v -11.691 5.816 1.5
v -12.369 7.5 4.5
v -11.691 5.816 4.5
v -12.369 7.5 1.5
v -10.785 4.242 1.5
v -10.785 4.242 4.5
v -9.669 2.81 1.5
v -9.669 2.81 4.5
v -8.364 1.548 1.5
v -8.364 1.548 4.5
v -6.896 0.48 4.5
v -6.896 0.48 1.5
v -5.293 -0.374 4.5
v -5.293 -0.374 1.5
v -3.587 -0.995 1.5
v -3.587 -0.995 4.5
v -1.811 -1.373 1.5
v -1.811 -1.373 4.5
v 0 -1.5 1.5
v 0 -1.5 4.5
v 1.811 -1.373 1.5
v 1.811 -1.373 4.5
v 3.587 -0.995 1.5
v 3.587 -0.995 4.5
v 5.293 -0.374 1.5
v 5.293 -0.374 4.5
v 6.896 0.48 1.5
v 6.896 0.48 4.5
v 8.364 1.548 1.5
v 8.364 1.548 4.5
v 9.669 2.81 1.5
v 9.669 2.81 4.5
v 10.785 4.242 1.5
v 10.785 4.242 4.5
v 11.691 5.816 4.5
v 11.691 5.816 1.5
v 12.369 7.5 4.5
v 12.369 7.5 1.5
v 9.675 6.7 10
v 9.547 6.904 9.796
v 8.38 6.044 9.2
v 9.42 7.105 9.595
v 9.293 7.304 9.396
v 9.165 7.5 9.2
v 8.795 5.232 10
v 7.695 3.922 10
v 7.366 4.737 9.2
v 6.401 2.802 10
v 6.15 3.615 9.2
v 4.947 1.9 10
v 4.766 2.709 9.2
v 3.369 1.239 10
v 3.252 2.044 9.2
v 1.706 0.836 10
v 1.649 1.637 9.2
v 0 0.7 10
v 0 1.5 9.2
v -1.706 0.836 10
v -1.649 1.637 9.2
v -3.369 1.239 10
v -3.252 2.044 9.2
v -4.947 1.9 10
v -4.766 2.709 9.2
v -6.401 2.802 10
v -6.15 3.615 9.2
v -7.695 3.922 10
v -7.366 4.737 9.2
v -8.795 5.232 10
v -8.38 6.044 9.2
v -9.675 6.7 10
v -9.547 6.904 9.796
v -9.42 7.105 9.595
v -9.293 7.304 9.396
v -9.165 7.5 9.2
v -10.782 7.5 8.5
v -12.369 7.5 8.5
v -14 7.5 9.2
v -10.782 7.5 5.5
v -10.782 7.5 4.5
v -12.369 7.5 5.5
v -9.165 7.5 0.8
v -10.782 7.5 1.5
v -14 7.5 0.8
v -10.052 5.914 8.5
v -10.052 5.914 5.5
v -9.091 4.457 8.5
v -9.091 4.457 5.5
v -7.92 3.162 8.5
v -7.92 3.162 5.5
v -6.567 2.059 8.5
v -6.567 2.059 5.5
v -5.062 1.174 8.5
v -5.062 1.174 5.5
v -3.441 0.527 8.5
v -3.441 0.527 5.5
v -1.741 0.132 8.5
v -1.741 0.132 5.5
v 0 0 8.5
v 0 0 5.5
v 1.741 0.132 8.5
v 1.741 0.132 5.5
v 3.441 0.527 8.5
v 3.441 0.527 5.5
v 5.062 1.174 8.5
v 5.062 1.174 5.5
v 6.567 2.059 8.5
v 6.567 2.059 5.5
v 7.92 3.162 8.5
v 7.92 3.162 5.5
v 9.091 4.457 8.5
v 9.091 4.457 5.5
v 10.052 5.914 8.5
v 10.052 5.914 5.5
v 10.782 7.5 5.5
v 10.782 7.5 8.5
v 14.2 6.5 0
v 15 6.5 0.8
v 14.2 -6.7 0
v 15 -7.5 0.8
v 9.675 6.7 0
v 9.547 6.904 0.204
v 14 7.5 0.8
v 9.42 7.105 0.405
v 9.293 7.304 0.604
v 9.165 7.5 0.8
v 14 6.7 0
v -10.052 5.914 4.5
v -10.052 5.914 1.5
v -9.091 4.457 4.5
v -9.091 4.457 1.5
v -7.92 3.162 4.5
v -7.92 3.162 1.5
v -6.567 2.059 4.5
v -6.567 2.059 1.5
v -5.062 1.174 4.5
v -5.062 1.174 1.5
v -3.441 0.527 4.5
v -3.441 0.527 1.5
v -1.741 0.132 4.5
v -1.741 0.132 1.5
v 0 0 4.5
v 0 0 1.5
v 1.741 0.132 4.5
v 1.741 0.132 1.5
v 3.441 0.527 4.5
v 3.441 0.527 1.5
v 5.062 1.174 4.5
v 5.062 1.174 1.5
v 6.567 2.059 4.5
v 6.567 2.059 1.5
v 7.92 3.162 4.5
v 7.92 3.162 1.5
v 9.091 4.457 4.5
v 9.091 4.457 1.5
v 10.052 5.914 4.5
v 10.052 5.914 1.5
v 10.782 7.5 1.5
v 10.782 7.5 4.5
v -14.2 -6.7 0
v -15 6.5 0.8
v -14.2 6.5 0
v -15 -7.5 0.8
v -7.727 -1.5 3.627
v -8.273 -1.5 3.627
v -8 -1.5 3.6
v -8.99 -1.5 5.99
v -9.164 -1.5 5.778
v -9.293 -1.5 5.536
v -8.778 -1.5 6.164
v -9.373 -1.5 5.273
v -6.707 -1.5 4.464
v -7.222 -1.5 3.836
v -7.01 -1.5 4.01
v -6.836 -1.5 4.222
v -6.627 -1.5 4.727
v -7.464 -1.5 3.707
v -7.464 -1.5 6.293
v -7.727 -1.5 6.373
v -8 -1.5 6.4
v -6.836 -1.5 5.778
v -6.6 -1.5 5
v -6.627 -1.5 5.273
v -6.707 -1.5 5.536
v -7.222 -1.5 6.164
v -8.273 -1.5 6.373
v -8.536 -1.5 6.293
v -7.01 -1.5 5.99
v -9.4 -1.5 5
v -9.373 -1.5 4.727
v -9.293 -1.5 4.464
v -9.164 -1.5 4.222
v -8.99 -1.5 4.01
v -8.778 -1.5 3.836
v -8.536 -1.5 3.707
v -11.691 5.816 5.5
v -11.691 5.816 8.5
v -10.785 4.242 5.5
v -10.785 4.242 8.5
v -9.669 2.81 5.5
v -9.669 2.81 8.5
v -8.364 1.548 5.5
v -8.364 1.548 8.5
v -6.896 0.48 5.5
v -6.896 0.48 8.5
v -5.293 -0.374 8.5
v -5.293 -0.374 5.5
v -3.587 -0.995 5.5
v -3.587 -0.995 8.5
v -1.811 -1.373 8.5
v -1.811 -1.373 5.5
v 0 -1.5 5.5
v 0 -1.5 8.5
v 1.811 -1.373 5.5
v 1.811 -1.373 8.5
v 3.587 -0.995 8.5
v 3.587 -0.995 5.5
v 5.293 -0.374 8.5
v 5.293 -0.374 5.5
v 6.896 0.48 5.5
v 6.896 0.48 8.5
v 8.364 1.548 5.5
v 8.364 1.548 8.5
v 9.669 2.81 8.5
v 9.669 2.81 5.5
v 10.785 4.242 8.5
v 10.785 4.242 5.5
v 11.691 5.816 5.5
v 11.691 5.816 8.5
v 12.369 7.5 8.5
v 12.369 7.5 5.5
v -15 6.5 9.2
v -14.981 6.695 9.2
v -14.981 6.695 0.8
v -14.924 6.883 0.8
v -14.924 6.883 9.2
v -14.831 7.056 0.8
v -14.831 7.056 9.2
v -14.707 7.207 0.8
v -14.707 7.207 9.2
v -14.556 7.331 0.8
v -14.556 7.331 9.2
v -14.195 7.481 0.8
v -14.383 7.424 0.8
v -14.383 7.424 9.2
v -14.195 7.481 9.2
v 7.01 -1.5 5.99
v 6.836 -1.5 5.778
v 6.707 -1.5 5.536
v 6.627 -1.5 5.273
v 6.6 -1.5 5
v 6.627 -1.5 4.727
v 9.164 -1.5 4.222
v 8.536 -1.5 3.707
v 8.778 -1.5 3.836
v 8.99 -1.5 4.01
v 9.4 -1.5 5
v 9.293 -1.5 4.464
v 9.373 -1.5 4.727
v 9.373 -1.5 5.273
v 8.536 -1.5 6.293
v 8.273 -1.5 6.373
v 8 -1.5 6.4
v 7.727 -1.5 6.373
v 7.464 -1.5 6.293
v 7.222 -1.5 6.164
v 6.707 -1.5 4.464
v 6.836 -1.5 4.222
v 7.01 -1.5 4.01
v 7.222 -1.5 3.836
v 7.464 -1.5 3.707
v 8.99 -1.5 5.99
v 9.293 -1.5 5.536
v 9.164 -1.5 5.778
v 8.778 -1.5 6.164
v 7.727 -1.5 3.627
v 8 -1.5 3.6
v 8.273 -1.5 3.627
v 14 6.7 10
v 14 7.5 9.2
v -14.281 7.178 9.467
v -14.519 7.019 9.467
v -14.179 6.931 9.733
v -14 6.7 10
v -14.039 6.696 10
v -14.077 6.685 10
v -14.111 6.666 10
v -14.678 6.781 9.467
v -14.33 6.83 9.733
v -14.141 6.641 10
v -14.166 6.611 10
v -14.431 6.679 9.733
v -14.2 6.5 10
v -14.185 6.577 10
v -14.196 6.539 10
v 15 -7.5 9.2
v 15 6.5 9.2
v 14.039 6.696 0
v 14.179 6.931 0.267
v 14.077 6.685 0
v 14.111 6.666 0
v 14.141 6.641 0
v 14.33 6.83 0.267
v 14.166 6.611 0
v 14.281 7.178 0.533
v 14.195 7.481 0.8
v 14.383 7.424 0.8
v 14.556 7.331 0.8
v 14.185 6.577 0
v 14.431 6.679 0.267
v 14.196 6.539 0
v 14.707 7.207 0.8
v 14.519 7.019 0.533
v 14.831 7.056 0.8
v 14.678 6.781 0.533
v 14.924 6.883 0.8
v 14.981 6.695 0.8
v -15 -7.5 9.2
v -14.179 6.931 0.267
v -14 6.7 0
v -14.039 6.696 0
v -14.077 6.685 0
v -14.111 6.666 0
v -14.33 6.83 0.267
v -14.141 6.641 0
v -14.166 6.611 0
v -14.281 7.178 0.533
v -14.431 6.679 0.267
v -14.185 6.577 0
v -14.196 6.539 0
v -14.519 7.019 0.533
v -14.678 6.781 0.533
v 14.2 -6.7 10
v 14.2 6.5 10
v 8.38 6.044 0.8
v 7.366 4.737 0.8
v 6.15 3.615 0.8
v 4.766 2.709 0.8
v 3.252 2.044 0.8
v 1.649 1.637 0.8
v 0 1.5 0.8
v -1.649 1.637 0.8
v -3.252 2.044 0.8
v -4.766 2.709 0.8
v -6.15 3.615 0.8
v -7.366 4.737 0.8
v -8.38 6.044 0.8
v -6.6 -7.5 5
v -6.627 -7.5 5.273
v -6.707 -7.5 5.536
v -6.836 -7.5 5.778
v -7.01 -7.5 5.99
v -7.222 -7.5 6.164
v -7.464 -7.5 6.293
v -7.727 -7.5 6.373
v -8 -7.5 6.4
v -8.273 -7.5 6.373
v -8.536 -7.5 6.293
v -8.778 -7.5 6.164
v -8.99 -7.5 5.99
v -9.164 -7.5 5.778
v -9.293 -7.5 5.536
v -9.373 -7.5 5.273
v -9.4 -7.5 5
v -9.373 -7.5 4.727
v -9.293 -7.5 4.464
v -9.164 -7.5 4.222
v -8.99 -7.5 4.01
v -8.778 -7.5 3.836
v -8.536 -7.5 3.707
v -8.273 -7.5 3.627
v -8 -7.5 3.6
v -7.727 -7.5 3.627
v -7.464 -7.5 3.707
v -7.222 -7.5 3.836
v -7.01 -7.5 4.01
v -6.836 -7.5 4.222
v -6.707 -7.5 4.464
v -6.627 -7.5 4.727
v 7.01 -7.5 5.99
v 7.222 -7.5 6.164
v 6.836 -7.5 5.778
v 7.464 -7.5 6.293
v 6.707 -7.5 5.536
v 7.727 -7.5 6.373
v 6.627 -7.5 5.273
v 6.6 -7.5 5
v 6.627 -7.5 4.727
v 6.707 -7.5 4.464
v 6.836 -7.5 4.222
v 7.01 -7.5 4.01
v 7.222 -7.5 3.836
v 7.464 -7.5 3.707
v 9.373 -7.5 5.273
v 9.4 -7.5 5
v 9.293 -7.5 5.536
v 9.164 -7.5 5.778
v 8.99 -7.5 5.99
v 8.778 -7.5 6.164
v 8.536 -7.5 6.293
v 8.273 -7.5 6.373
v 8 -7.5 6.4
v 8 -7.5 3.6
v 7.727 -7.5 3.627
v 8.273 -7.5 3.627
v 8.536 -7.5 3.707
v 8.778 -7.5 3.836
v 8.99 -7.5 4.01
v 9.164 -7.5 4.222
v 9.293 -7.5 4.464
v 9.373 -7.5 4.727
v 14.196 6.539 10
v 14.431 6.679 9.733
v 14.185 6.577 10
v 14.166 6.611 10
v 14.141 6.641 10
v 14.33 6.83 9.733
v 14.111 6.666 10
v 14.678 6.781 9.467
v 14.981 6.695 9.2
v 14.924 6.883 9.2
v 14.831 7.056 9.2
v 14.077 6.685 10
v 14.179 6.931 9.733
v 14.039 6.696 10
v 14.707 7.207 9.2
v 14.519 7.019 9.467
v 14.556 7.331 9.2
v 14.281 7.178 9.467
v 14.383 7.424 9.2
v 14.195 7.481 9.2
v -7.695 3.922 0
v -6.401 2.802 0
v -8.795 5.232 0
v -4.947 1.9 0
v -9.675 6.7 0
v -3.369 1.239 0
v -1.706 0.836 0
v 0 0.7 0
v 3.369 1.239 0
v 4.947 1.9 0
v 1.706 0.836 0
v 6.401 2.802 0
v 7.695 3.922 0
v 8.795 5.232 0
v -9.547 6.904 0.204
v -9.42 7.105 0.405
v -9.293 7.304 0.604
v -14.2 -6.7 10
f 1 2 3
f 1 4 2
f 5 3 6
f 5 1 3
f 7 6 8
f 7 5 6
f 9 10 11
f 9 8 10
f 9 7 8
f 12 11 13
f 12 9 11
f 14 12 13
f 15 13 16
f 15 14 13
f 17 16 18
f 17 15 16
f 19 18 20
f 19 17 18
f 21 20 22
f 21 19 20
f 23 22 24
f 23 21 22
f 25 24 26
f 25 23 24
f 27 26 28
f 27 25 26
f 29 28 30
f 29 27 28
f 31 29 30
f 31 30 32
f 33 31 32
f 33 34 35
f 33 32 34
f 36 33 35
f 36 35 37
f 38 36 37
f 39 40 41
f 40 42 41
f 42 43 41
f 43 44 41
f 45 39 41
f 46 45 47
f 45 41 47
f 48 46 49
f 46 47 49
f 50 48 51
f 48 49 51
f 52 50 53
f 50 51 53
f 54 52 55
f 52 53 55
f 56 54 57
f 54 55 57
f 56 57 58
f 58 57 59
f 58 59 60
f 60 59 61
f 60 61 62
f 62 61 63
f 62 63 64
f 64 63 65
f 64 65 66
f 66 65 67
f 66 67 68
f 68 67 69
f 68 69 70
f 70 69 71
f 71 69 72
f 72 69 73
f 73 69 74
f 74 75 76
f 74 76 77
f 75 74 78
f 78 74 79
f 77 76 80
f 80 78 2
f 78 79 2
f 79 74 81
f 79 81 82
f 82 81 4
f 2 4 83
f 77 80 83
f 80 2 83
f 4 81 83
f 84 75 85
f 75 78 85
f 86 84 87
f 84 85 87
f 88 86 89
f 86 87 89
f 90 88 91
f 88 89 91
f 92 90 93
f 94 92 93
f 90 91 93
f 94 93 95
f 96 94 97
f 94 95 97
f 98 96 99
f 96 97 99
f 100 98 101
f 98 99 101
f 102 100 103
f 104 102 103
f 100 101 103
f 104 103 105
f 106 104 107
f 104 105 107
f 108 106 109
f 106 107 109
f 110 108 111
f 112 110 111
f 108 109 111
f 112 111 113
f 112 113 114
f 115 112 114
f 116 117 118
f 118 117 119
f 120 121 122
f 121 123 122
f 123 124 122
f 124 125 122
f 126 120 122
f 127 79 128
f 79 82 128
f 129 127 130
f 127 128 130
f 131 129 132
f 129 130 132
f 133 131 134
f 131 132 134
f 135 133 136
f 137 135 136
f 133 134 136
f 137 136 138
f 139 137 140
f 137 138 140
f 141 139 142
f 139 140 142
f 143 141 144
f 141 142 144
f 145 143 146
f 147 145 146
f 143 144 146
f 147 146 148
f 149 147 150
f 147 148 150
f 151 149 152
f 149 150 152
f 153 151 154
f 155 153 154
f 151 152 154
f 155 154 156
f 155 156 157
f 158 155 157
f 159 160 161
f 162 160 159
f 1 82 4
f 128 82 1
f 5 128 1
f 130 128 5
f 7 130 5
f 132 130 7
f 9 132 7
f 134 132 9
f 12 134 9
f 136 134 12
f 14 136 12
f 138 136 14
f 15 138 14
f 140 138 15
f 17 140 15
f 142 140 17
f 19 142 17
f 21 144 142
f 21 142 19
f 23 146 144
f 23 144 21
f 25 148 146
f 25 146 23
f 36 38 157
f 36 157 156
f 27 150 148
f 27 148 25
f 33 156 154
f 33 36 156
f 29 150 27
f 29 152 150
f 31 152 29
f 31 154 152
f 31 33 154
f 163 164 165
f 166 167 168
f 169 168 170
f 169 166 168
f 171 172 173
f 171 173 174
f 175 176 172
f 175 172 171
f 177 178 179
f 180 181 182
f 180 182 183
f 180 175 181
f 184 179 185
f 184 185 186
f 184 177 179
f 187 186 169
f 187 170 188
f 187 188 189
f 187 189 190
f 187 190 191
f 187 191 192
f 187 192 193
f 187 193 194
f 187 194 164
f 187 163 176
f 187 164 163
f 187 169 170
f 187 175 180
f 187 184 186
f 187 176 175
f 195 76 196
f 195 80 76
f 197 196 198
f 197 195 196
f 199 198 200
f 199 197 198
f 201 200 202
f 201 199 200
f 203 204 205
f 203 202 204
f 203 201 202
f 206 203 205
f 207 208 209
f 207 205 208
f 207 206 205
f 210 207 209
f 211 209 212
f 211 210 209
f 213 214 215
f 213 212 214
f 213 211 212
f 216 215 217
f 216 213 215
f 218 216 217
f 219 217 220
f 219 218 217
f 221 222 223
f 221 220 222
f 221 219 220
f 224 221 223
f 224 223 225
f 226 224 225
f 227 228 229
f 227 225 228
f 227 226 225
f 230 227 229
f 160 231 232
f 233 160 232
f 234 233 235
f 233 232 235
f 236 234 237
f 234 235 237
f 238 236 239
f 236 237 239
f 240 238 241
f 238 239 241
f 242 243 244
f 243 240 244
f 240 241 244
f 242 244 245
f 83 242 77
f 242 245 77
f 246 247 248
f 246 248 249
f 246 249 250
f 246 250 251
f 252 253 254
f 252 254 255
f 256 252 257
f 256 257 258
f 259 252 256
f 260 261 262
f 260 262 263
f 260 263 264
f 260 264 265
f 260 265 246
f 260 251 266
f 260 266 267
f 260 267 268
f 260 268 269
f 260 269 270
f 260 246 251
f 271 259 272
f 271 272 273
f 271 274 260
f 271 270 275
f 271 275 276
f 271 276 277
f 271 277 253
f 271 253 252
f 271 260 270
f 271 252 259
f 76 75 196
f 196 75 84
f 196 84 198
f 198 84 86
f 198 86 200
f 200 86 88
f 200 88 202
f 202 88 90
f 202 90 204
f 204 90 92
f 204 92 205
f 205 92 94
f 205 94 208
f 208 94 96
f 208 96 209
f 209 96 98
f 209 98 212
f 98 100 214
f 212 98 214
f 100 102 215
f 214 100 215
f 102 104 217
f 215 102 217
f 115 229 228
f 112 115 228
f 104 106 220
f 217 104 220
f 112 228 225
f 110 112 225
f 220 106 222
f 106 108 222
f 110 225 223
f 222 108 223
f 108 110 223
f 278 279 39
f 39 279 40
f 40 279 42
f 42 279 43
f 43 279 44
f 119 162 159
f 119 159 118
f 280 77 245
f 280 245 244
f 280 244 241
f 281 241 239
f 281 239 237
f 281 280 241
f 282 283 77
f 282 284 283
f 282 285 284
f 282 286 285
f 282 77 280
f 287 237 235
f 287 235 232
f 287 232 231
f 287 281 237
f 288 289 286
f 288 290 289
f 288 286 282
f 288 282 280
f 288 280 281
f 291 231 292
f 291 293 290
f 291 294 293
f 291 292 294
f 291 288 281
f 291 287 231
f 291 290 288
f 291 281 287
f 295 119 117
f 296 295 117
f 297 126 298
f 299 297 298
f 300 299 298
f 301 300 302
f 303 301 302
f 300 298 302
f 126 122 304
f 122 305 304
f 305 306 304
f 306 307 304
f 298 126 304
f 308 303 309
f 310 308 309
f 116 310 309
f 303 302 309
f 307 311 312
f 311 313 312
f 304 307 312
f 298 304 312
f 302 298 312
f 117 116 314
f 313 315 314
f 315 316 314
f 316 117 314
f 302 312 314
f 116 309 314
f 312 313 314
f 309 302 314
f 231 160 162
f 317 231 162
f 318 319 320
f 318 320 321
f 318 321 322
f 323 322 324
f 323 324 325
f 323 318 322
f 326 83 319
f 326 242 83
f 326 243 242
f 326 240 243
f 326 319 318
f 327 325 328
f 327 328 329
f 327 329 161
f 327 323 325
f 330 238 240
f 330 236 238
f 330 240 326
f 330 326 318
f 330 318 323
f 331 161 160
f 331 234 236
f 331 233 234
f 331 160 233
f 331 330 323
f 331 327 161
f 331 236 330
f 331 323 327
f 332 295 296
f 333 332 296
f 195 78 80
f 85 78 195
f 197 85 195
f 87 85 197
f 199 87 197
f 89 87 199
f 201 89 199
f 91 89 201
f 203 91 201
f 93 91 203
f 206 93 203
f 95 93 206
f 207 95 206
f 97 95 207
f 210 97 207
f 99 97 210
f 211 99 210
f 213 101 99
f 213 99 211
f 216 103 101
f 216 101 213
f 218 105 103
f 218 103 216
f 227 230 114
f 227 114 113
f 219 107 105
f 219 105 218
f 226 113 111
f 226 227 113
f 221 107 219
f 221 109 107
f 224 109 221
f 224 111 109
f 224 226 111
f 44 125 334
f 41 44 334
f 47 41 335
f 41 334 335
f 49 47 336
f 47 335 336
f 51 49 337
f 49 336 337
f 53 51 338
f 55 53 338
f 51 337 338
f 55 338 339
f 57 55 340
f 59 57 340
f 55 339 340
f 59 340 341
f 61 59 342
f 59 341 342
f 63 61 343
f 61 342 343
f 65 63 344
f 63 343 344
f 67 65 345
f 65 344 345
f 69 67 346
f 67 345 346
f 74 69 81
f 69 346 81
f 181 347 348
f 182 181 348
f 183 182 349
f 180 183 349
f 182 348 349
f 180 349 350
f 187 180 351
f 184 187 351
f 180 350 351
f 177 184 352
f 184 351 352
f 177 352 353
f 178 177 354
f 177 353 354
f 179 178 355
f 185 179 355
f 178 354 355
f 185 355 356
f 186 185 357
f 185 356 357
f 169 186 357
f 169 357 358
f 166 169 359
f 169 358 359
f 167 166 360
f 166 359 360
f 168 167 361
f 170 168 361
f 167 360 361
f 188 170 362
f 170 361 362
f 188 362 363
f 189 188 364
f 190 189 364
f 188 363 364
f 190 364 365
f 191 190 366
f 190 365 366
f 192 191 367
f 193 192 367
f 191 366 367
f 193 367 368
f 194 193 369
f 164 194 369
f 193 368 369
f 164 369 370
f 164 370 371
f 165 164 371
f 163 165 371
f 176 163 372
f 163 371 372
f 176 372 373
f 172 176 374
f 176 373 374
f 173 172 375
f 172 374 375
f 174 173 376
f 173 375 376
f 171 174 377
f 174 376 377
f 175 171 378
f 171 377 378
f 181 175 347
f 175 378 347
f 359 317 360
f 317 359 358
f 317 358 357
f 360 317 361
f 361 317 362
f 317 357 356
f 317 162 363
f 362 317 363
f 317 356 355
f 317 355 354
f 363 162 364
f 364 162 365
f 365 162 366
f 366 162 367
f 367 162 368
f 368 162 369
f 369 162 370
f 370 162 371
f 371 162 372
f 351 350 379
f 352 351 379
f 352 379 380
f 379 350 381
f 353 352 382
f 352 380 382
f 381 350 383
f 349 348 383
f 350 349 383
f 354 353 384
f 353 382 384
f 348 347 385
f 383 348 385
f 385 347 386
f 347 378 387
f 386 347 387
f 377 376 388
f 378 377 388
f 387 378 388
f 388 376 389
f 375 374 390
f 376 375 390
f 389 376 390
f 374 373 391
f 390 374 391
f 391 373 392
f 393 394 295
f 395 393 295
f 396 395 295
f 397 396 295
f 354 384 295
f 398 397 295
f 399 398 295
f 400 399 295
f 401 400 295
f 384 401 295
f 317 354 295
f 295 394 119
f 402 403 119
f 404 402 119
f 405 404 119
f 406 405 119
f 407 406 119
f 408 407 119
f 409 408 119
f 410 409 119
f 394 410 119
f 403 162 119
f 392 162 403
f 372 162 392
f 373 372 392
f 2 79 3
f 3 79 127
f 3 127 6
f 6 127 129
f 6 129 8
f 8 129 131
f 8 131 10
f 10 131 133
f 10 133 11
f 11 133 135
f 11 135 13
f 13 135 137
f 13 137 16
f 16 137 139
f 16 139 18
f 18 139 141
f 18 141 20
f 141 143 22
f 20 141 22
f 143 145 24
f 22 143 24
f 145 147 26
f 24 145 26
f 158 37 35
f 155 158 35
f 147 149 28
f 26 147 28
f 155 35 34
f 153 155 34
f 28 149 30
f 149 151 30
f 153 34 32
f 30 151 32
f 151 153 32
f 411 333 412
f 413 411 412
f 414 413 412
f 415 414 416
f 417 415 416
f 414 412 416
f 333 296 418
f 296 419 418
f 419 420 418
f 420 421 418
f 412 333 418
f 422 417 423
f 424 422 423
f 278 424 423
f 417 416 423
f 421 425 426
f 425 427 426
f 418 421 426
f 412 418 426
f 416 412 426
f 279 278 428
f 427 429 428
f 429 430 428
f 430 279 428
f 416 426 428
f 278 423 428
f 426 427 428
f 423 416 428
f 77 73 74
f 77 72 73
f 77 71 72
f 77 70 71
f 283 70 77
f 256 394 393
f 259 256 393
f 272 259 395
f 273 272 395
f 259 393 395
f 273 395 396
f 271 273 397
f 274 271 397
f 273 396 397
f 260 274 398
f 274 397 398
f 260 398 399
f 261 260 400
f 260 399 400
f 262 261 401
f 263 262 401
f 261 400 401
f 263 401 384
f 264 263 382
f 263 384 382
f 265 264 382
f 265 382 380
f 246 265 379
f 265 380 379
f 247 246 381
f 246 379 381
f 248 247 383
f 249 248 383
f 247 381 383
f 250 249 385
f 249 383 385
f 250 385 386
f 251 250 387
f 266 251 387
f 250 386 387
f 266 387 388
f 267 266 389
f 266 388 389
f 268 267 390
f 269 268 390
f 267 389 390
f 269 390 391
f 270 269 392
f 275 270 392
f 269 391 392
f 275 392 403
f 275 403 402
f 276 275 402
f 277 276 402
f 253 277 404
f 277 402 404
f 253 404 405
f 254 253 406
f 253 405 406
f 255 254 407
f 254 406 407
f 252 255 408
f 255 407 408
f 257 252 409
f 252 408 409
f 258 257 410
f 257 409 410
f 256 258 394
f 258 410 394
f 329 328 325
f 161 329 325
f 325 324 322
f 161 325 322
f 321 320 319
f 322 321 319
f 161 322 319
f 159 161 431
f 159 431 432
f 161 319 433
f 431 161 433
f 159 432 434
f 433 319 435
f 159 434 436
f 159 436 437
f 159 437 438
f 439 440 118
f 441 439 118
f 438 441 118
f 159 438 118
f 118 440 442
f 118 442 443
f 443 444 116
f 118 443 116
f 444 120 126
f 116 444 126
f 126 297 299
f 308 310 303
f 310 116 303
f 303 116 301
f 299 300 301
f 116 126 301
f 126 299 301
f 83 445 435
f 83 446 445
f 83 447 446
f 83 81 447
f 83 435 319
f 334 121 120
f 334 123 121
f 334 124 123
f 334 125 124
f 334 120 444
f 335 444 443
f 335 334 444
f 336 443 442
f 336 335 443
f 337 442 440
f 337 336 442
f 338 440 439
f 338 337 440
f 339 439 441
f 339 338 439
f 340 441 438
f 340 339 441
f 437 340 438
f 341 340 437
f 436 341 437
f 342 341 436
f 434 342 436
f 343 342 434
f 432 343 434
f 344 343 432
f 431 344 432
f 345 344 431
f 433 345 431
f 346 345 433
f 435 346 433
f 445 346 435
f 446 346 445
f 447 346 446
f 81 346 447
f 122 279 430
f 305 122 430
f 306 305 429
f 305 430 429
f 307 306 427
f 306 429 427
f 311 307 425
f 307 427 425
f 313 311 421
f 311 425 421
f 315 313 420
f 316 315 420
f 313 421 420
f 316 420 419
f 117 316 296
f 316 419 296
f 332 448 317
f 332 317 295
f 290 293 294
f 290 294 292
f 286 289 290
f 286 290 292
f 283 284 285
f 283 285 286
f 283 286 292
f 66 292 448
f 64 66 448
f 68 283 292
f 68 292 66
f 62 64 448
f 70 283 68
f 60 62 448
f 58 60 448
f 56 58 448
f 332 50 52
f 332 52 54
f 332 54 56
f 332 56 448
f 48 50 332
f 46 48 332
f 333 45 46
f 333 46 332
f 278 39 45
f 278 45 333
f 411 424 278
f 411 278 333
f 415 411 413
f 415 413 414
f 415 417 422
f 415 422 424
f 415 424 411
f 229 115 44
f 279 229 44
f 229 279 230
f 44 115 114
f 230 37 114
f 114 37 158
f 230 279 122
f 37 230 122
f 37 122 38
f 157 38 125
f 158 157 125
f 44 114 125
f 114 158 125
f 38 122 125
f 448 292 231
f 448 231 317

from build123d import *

# Parameters (mm, degrees)
BOSS_EXTRUDE1_DEPTH = 10
SKETCH2_R           = 1.4
CUT_EXTRUDE1_DEPTH  = 6
SKETCH3_W           = 3
SKETCH3_H           = 1.5
FILLET1_R           = 1
CHAMFER1_SIZE       = 0.8


with BuildPart() as part:
    # Sketch1 → Boss-Extrude1 (new body)
    with BuildSketch(Plane.XY):
        with BuildLine():
            Line((-15, 7.5), (-15, -7.5))
            Line((-15, -7.5), (15, -7.5))
            Line((15, -7.5), (15, 7.5))
            Line((15, 7.5), (9.16515139, 7.5))
            ThreePointArc((9.16515139, 7.5), (0, 1.5), (-9.16515139, 7.5))
            Line((-9.16515139, 7.5), (-15, 7.5))
        make_face()
    extrude(amount=BOSS_EXTRUDE1_DEPTH)

    # Sketch2 → Cut-Extrude1 (cut)
    with BuildSketch(Plane.XZ.offset(7.5)):
        with Locations((-8, 5)):
            Circle(SKETCH2_R)
        with Locations((8, 5)):
            Circle(SKETCH2_R)
    extrude(amount=-CUT_EXTRUDE1_DEPTH, mode=Mode.SUBTRACT)

    # Sketch3 → Cut-Revolve1 (revolve, cut)
    with BuildSketch(Plane(origin=(0, 0, 0), x_dir=(0, 0, -1), z_dir=(1, 0, 0))):
        with Locations((-7, -0.75)):
            Rectangle(SKETCH3_W, SKETCH3_H)
        with Locations((-3, -0.75)):
            Rectangle(SKETCH3_W, SKETCH3_H)
    revolve(axis=Axis((0, 11.5, 0), (0, 0, 1)), mode=Mode.SUBTRACT)

    # Fillet1
    fillet1_edges = [part.edges().sort_by_distance(p)[0] for p in [
        (15, 7.5, 5),
        (-15, 7.5, 5),
    ]]
    fillet(fillet1_edges, radius=FILLET1_R)

    # Chamfer1
    chamfer1_edges = [part.edges().sort_by_distance(p)[0] for p in [
        (0, 1.5, 0),
        (-15, -0.5, 10),
        (0, -7.5, 10),
        (15, -0.5, 10),
        (11.582575695, 7.5, 10),
        (-11.582575695, 7.5, 0),
        (-14.707106781, 7.207106781, 0),
        (14.707106781, 7.207106781, 0),
        (-11.582575695, 7.5, 10),
        (0, 1.5, 10),
        (-14.707106781, 7.207106781, 10),
        (14.707106781, 7.207106781, 10),
        (11.582575695, 7.5, 0),
        (15, -0.5, 0),
        (0, -7.5, 0),
        (-15, -0.5, 0),
    ]]
    chamfer(chamfer1_edges, length=CHAMFER1_SIZE)


solid = part.part
